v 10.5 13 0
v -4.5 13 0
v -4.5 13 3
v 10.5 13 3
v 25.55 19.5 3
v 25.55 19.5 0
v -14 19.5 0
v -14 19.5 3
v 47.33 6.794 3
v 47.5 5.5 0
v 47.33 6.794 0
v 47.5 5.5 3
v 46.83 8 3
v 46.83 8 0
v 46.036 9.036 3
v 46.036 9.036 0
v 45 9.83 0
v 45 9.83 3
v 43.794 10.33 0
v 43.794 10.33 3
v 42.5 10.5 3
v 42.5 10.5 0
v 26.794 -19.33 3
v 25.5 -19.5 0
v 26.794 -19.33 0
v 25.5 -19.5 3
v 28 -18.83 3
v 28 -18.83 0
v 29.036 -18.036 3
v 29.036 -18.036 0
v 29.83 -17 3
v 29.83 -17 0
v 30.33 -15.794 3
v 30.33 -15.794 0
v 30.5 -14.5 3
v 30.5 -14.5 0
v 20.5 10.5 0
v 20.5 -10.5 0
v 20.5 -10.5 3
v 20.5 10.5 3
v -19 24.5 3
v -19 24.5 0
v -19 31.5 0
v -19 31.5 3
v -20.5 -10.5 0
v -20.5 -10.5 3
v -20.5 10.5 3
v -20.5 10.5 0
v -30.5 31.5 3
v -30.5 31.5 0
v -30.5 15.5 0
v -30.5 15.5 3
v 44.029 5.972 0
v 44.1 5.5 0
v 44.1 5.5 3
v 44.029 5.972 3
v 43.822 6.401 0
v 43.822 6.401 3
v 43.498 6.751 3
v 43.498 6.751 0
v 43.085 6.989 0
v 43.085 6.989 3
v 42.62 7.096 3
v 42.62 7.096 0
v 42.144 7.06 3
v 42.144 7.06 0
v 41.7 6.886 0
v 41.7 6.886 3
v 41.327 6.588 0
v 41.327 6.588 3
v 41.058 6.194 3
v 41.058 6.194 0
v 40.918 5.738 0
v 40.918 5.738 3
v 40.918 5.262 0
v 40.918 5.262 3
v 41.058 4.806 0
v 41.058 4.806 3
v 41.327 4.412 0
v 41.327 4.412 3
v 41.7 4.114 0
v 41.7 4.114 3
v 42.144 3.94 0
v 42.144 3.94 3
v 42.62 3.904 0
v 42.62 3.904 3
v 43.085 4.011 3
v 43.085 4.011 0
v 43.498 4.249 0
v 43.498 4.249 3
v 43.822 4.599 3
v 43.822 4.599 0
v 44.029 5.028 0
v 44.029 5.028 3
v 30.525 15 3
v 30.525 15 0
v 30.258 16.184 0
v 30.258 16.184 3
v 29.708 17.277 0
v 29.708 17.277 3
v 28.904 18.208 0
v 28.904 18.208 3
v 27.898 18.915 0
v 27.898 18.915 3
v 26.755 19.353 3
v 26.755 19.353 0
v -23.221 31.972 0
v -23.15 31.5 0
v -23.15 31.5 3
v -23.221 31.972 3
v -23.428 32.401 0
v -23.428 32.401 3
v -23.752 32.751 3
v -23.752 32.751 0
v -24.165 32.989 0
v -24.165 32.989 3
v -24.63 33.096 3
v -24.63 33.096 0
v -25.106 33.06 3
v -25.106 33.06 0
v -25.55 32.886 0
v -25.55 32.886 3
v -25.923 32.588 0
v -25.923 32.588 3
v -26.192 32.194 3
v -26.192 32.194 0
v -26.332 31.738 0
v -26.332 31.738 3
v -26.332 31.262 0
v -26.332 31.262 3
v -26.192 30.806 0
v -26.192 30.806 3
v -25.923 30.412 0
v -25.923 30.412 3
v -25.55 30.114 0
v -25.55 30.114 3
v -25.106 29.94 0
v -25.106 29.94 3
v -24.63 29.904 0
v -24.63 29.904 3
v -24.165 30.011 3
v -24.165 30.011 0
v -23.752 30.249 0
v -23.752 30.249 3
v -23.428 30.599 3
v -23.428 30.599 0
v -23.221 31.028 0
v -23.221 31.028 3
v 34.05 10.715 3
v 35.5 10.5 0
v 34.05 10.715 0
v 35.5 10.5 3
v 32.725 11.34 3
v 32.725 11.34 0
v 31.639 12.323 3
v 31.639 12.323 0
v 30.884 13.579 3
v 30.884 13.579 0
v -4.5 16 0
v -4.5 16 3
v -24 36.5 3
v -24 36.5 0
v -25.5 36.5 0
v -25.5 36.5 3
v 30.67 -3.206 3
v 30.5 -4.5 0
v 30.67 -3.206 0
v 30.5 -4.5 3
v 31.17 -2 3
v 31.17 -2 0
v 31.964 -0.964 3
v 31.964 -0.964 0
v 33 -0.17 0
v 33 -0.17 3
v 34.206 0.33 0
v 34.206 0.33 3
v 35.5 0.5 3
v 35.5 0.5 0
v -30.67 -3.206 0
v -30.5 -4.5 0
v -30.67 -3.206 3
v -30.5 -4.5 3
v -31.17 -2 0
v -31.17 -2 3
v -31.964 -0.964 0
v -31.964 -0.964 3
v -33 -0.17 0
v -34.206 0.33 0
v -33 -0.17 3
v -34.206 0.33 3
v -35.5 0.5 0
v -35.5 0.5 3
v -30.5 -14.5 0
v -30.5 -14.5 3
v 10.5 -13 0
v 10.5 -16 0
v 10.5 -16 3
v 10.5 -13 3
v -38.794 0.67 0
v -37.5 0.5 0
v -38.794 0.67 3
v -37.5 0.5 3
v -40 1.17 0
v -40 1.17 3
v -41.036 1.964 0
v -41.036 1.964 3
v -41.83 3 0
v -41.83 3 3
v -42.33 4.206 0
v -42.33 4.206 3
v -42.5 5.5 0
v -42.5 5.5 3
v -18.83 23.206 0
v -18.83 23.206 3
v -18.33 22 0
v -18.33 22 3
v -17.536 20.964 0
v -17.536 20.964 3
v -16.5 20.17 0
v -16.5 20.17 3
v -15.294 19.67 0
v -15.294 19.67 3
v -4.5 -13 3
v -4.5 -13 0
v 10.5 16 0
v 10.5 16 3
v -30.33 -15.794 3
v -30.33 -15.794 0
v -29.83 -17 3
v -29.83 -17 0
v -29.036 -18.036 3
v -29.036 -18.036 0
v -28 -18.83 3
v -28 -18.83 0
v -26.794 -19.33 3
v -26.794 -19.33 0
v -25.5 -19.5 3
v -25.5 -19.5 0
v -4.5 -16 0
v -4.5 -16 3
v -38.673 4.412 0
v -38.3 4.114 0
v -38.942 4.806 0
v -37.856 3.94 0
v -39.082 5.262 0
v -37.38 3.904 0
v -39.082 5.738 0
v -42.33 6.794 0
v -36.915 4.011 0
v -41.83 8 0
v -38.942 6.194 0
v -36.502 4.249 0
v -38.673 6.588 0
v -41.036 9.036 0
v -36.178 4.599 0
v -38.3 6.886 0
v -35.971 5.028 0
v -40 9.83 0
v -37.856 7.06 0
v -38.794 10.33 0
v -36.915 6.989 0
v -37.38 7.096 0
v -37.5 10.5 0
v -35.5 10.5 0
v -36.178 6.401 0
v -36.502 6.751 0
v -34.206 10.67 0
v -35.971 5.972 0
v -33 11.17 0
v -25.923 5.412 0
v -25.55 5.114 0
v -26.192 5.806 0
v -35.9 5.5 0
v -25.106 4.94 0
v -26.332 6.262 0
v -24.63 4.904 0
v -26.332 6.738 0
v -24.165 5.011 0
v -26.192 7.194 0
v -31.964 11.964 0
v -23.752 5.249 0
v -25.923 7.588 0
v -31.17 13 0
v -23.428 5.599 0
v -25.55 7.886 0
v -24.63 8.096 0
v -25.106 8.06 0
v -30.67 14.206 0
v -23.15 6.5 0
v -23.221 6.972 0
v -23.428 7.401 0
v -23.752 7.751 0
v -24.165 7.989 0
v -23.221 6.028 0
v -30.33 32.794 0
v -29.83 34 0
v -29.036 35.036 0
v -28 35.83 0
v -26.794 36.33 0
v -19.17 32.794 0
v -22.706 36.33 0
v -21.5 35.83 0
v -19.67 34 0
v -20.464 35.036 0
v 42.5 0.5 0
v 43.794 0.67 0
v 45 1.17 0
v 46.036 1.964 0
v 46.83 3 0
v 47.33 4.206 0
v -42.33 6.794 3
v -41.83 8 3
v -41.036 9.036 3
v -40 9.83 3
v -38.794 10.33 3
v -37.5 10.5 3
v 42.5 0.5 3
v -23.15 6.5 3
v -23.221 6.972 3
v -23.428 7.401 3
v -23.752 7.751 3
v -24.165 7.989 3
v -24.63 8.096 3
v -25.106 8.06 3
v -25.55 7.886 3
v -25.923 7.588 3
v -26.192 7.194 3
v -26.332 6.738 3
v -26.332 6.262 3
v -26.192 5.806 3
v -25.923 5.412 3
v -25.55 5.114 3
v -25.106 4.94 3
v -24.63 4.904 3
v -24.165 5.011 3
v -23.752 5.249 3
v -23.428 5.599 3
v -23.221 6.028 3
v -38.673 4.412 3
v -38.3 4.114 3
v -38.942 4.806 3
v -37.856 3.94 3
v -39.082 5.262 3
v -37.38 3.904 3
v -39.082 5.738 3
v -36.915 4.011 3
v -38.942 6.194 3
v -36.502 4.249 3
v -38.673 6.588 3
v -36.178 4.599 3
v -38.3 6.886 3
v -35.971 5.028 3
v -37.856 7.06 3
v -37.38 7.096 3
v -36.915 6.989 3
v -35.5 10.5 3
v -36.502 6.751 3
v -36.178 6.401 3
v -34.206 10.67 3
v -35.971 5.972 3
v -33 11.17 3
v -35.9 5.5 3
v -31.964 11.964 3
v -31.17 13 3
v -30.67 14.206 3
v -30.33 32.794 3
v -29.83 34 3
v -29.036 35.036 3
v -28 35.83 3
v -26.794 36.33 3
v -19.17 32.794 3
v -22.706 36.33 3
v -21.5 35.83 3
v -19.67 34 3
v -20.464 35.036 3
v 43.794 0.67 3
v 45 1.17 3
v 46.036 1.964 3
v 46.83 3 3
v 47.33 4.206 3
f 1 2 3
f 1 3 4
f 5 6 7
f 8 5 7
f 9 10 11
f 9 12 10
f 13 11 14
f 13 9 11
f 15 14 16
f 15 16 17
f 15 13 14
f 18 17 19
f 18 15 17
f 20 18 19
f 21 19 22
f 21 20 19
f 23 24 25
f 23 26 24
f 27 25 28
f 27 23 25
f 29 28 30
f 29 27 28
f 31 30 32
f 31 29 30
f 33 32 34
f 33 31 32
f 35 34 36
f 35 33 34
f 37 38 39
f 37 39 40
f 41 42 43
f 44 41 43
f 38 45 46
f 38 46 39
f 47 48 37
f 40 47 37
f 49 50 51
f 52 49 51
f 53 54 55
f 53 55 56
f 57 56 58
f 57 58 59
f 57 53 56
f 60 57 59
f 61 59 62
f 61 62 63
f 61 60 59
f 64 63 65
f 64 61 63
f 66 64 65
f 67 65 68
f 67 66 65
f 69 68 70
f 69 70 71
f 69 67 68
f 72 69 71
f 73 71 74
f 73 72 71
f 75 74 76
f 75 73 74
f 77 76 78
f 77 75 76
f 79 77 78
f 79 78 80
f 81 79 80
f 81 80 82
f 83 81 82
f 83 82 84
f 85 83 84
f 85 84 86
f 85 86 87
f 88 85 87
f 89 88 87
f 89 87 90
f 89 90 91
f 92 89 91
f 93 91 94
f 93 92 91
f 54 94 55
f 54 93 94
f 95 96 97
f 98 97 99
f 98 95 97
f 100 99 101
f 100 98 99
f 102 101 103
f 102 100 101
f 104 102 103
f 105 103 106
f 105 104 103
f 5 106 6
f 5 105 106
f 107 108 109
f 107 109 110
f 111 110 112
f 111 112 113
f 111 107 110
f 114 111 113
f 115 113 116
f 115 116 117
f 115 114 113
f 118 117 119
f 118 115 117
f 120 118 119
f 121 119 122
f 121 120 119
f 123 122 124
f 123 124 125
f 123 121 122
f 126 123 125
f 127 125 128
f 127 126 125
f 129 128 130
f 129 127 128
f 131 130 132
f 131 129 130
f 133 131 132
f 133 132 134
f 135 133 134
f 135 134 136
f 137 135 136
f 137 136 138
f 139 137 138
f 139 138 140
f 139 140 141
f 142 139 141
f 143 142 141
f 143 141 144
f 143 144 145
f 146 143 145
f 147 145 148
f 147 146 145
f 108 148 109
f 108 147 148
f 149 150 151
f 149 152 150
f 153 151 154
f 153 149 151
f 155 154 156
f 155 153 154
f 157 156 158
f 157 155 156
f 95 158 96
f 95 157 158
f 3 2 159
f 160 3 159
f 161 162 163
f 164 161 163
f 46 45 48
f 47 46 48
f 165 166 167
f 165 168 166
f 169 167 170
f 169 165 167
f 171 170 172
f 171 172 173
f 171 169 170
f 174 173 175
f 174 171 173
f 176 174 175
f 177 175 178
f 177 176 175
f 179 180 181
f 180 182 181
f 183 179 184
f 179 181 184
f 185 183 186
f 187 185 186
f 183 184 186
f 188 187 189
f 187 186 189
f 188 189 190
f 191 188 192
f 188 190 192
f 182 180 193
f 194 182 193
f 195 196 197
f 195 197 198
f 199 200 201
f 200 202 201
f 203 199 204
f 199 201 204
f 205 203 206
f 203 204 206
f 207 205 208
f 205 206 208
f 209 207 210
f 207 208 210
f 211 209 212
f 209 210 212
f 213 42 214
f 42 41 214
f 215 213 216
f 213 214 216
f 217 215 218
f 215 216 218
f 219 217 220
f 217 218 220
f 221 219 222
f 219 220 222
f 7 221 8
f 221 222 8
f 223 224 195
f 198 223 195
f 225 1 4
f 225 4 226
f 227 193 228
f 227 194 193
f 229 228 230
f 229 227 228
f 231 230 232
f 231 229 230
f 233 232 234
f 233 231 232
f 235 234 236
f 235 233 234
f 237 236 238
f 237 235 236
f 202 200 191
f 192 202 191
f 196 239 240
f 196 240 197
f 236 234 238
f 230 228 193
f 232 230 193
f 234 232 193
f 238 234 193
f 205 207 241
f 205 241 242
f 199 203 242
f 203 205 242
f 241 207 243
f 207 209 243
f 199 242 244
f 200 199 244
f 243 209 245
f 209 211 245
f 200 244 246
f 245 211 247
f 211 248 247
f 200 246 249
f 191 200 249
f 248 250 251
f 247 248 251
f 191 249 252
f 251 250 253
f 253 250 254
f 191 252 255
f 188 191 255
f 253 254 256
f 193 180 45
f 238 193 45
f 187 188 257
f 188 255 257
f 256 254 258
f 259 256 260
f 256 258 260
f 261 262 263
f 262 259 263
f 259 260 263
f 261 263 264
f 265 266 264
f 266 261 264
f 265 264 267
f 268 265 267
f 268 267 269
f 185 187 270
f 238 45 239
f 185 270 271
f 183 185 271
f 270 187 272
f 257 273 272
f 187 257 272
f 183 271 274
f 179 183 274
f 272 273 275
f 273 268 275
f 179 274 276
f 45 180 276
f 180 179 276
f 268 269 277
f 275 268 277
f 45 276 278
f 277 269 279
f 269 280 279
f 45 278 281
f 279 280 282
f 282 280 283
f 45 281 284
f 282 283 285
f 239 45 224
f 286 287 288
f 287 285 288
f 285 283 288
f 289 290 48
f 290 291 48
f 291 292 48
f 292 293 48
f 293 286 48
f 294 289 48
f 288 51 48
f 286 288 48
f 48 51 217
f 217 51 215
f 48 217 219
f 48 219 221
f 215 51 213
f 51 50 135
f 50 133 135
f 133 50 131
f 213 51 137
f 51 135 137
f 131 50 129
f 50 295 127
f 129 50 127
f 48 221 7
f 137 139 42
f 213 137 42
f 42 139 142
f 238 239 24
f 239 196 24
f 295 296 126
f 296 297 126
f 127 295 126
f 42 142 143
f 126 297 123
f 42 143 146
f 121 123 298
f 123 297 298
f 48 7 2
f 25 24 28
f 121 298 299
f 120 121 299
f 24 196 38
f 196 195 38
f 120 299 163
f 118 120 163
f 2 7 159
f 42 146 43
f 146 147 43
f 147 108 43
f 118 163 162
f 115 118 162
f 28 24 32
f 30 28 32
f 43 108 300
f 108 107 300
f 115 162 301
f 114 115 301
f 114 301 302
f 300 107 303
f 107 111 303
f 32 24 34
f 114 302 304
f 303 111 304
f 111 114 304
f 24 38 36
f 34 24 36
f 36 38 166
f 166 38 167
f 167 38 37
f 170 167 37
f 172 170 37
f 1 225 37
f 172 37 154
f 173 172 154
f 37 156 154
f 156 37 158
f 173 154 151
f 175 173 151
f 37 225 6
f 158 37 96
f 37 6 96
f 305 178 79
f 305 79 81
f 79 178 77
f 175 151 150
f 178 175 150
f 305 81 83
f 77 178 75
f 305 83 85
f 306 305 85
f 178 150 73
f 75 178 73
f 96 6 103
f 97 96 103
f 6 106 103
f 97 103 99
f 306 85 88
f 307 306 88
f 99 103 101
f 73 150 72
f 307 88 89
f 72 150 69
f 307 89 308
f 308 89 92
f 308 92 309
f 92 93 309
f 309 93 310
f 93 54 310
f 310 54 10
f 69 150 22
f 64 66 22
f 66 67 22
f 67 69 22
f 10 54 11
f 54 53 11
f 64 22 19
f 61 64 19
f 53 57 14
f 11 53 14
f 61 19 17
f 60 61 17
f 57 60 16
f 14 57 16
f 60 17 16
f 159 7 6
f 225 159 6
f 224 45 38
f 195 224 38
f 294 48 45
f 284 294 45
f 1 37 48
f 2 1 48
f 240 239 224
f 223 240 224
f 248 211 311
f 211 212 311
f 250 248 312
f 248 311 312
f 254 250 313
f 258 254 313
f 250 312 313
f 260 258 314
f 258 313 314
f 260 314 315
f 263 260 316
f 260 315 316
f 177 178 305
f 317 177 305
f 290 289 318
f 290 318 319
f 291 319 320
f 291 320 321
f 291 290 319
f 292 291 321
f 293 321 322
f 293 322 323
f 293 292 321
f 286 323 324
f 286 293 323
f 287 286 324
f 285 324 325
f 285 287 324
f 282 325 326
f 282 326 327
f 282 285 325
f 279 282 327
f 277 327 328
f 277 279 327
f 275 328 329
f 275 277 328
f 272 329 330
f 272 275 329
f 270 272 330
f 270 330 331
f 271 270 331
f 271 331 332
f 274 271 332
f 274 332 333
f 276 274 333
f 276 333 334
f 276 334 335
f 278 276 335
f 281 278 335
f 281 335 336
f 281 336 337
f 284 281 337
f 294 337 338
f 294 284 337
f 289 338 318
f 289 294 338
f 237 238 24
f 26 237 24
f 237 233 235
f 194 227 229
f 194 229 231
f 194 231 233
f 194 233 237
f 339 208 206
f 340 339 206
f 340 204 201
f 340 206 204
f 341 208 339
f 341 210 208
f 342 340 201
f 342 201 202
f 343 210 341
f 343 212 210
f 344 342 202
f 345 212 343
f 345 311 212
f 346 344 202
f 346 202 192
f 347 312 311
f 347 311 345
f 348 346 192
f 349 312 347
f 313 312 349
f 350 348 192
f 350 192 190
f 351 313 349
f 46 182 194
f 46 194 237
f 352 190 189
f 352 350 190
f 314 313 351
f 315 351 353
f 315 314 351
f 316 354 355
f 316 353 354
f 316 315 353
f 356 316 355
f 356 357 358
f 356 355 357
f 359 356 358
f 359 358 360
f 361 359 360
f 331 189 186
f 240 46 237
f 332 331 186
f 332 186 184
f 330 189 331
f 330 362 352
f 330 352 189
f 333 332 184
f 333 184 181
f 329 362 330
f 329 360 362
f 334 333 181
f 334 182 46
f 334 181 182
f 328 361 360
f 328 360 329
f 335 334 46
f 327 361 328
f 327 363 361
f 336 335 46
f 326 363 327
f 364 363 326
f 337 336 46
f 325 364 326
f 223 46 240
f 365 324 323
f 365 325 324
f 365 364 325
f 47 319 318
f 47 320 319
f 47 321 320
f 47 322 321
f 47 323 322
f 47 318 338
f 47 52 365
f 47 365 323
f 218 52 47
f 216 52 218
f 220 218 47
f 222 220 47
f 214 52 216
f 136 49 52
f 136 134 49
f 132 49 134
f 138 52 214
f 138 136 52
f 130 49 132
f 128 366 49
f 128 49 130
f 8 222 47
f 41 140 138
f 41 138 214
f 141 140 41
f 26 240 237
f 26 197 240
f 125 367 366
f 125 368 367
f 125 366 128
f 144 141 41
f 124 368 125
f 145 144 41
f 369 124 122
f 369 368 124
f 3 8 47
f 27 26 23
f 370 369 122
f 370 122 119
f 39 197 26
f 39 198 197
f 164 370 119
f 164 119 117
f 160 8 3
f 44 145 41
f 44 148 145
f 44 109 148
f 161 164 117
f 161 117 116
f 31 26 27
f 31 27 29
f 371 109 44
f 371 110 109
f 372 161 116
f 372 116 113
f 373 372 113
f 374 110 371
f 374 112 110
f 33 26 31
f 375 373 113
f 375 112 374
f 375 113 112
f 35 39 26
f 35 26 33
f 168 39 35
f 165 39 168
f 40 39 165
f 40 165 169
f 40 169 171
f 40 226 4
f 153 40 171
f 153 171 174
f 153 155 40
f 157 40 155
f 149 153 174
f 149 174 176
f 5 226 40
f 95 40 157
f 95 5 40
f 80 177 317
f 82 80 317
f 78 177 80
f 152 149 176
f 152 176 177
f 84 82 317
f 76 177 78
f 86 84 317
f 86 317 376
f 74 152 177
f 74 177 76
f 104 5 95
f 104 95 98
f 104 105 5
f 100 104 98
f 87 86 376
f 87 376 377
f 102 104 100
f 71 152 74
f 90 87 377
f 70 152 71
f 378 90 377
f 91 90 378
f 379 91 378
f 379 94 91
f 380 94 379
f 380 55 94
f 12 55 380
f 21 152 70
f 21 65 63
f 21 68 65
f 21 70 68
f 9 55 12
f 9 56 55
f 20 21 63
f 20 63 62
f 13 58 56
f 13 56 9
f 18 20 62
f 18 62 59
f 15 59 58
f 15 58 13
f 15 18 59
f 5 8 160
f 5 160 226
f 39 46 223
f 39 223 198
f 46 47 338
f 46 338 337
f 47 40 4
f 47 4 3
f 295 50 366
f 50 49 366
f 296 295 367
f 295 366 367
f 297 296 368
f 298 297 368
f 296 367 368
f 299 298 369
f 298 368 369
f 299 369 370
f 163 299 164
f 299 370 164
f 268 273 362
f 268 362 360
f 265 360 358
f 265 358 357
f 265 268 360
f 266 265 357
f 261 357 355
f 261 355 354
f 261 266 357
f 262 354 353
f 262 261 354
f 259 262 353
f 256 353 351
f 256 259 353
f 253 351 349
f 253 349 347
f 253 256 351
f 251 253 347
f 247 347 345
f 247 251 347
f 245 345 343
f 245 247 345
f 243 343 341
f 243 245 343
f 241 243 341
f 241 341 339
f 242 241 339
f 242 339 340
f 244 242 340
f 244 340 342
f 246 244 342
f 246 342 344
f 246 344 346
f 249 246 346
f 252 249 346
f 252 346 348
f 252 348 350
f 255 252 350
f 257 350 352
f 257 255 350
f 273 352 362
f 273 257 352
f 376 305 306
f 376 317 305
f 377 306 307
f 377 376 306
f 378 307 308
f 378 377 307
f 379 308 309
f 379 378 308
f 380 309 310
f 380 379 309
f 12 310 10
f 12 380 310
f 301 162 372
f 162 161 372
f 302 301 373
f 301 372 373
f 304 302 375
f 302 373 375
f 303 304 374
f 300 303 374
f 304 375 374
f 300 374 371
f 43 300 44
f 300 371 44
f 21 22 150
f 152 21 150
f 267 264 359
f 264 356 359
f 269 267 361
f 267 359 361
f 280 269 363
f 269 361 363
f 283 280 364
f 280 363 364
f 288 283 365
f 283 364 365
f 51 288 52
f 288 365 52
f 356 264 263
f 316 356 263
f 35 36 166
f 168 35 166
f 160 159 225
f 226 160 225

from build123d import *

# Parameters (mm, degrees)
ESBO_O1_R                = 1.6
ESBO_O1_W                = 41
ESBO_O1_H                = 21
ESBO_O1_W_2              = 15
ESBO_O1_H_2              = 3
RESSALTO_EXTRUS_O1_DEPTH = 3
FILETE1_R                = 5
FILETE4_R                = 5


with BuildPart() as part:
    # Esboço1 → Ressalto-extrusão1 (new body)
    with BuildSketch(Plane.XY):
        Polygon((-30.5, 0.5), (-30.5, -19.5), (30.5, -19.5), (30.5, 0.5), (47.5, 0.5), (47.5, 10.5), (30.5, 10.5), (30.5, 19.5), (-19, 19.5), (-19, 36.5), (-30.5, 36.5), (-30.5, 10.5), (-42.5, 10.5), (-42.5, 0.5), align=None)
        with Locations((-24.75, 6.5)):
            Circle(ESBO_O1_R, mode=Mode.SUBTRACT)
        Rectangle(ESBO_O1_W, ESBO_O1_H, mode=Mode.SUBTRACT)
        with Locations((3, -14.5)):
            Rectangle(ESBO_O1_W_2, ESBO_O1_H_2, mode=Mode.SUBTRACT)
        with Locations((3, 14.5)):
            Rectangle(ESBO_O1_W_2, ESBO_O1_H_2, mode=Mode.SUBTRACT)
        with Locations((-37.5, 5.5)):
            Circle(ESBO_O1_R, mode=Mode.SUBTRACT)
        with Locations((42.5, 5.5)):
            Circle(ESBO_O1_R, mode=Mode.SUBTRACT)
        with Locations((-24.75, 31.5)):
            Circle(ESBO_O1_R, mode=Mode.SUBTRACT)
    extrude(amount=RESSALTO_EXTRUS_O1_DEPTH)

    # Filete1
    filete1_edges = [part.edges().sort_by_distance(p)[0] for p in [
        (-19, 36.5, 1.5),
        (-30.5, 36.5, 1.5),
        (30.5, -19.5, 1.5),
        (-30.5, -19.5, 1.5),
        (-42.5, 0.5, 1.5),
        (-19, 19.5, 1.5),
        (-30.5, 0.5, 1.5),
        (-30.5, 10.5, 1.5),
        (-42.5, 10.5, 1.5),
        (30.5, 0.5, 1.5),
        (47.5, 0.5, 1.5),
        (47.5, 10.5, 1.5),
        (30.5, 10.5, 1.5),
    ]]
    fillet(filete1_edges, radius=FILETE1_R - 0.0001)  # a hair under: the kernel refuses the full size

    # Filete4
    filete4_edges = [part.edges().sort_by_distance(p)[0] for p in [
        (30.5, 19.5, 1.5),
    ]]
    fillet(filete4_edges, radius=FILETE4_R)


solid = part.part
